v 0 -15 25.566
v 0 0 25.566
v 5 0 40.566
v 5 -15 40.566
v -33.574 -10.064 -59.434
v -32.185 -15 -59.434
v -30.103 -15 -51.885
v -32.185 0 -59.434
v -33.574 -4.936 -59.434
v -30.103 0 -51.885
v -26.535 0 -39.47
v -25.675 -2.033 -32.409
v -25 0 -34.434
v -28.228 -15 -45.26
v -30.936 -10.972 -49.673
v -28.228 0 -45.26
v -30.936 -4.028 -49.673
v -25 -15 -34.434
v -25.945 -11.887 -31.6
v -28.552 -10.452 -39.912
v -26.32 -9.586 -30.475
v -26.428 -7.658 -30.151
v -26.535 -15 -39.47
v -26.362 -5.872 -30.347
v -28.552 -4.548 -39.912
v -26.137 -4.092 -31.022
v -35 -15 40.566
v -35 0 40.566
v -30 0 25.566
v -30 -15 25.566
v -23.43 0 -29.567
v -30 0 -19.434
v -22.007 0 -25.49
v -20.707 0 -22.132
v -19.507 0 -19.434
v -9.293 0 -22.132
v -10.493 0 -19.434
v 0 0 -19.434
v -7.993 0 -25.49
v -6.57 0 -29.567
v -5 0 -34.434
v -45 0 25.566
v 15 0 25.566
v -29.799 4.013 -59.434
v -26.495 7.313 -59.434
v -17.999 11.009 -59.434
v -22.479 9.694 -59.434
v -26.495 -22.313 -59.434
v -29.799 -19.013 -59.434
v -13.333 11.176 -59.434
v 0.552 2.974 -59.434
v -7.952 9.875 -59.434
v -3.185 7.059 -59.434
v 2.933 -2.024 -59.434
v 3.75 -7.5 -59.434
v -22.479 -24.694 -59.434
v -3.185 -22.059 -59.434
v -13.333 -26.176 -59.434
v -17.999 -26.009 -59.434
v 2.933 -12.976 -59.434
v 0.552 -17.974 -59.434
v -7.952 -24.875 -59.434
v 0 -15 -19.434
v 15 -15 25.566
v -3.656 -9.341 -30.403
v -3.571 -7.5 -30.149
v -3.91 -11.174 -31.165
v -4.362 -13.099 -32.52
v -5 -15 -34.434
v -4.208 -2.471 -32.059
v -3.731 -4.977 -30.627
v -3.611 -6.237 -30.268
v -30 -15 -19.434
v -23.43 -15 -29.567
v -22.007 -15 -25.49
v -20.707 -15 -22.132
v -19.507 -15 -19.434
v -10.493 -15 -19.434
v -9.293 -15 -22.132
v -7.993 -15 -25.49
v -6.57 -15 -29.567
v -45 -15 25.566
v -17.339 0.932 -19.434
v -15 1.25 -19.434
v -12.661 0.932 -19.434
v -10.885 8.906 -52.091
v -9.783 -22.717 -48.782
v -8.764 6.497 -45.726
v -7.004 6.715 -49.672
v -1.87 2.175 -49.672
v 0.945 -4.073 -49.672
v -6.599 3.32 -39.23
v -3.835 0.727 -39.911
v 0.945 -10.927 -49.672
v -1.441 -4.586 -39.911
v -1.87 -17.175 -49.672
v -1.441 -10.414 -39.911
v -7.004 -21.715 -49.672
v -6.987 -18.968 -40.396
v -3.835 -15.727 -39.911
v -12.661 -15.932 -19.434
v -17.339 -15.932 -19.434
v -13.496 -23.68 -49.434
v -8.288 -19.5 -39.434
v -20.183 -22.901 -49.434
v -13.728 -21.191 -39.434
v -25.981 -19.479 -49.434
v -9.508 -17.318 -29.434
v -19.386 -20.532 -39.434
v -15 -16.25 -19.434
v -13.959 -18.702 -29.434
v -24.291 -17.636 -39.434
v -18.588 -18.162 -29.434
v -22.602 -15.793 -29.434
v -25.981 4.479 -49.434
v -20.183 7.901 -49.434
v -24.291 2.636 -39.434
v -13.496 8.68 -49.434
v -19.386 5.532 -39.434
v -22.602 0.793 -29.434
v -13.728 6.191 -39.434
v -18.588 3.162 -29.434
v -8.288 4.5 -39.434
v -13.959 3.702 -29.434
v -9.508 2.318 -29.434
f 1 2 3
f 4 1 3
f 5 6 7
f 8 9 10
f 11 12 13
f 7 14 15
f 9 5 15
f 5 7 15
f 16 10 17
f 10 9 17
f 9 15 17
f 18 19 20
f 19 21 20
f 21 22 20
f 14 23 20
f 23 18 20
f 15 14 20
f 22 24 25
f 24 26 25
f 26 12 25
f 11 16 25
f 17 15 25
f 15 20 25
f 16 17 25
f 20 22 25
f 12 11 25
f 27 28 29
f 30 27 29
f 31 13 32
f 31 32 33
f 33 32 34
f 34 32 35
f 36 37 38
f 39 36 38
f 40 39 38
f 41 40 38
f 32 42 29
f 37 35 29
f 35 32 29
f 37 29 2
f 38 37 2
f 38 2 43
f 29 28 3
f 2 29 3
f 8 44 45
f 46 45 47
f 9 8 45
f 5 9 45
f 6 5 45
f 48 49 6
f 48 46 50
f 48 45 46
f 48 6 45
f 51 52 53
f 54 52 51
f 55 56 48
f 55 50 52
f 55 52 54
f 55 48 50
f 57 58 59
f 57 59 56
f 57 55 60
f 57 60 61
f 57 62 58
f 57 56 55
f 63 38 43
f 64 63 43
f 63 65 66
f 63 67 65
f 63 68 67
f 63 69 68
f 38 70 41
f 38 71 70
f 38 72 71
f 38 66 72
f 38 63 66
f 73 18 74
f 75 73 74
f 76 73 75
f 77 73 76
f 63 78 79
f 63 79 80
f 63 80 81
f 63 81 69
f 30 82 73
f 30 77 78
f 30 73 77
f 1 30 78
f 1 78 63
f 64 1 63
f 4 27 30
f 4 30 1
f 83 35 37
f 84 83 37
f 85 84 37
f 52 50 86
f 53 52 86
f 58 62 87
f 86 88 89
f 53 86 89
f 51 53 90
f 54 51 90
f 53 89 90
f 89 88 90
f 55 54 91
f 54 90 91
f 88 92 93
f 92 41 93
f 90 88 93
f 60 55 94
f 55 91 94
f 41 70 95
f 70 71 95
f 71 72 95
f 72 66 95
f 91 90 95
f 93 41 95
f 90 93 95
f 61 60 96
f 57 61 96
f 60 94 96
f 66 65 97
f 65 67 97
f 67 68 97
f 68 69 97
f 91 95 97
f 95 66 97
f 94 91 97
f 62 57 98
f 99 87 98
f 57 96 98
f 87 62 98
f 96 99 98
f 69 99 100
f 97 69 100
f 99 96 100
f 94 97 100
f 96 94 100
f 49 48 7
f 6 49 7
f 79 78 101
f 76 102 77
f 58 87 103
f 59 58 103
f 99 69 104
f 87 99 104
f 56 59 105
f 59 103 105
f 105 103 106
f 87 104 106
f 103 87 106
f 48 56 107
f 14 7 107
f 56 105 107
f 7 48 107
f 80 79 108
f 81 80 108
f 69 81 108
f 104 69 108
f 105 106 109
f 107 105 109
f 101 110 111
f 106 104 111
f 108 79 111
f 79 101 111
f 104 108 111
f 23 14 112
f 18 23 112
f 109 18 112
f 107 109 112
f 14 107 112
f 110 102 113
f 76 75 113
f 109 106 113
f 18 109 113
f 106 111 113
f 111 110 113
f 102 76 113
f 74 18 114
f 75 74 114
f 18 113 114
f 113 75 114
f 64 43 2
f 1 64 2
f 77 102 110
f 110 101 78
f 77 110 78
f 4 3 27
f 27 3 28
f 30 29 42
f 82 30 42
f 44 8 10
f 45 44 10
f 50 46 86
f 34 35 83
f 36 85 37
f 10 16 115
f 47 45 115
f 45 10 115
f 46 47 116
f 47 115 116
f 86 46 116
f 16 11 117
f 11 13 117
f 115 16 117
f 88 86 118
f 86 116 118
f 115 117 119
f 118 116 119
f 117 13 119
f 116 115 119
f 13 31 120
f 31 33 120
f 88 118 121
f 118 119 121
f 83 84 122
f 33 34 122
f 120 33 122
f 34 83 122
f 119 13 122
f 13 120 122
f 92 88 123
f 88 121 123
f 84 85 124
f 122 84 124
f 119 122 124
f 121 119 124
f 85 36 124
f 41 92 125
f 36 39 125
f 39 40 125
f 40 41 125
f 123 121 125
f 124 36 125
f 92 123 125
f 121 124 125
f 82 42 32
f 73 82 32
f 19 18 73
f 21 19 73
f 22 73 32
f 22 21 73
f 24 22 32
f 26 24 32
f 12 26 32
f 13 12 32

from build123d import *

# Parameters (mm, degrees)
F1_DEPTH = 15
F2_R     = 18.75
F3_DEPTH = 40


# Not quite as in the source:
# - a fillet or chamfer that OpenCascade refuses, or shapes differently, is made with other operations: its cross-section is extruded or revolved along the edge and cut away or added


with BuildPart() as f1:
    # F0 (on Front) → F1 (new body)
    with BuildSketch(Plane.XZ):
        Polygon((-15, 40.5656324383), (-35, 40.5656324383), (-30, 25.5656324383), (-15, 25.5656324383), align=None)
        Polygon((5, 40.5656324383), (-15, 40.5656324383), (-15, 25.5656324383), (0, 25.5656324383), align=None)
        Polygon((-15, 25.5656324383), (-30, 25.5656324383), (-45, 25.5656324383), (-30, -19.4343675617), (0, -19.4343675617), (15, 25.5656324383), (0, 25.5656324383), align=None)
    extrude(amount=F1_DEPTH)

    # F2 (on face) → F3 (join)
    with BuildSketch(Plane(origin=(0, 0, -19.4343675617), x_dir=(1, 0, 0), z_dir=(0, 0, -1))):
        with Locations((-15, 7.5)):
            Circle(F2_R)
    extrude(amount=F3_DEPTH)

    # F4: chamfer of 10 x 40 on 1 edges, made by hand


with BuildPart() as f4_tool2:
    # F4_s3 → F4_t4 (revolve)
    with BuildSketch(Plane.XZ.offset(7.5)):
        Polygon((3.75, -59.4343675617), (-6.25, -19.4343675617), (3.75, -19.4343675617), align=None)
    revolve(axis=Axis((-15, -7.5, -19.4343675617), (0, 0, -1)))

    split(bisect_by=Plane(origin=(5.8303102685, 0, -1.9434367562), x_dir=(0, 1, 0), z_dir=(0.9486832981, 0, -0.316227766)), keep=Keep.TOP)


with BuildPart() as f1_1:
    add(f1.part)

    # F4_t1: cut F4_tool2
    add(f4_tool2.part, mode=Mode.SUBTRACT)


with BuildPart() as f4_tool7:
    # F4_s8 → F4_t9 (revolve)
    with BuildSketch(Plane.XZ.offset(7.5)):
        Polygon((3.75, -59.4343675617), (-6.25, -19.4343675617), (3.75, -19.4343675617), align=None)
    revolve(axis=Axis((-15, -7.5, -19.4343675617), (0, 0, -1)))

    split(bisect_by=Plane.XZ.offset(15), keep=Keep.TOP)


with BuildPart() as f1_2:
    add(f1_1.part)

    # F4_t6: cut F4_tool7
    add(f4_tool7.part, mode=Mode.SUBTRACT)


with BuildPart() as f4_tool12:
    # F4_s13 → F4_t14 (revolve)
    with BuildSketch(Plane.XZ.offset(7.5)):
        Polygon((3.75, -59.4343675617), (-6.25, -19.4343675617), (3.75, -19.4343675617), align=None)
    revolve(axis=Axis((-15, -7.5, -19.4343675617), (0, 0, -1)))

    split(bisect_by=Plane.XZ, keep=Keep.BOTTOM)


with BuildPart() as f1_3:
    add(f1_2.part)

    # F4_t11: cut F4_tool12
    add(f4_tool12.part, mode=Mode.SUBTRACT)


with BuildPart() as f4_tool17:
    # F4_s18 → F4_t19 (revolve)
    with BuildSketch(Plane.XZ.offset(7.5)):
        Polygon((3.75, -59.4343675617), (-6.25, -19.4343675617), (3.75, -19.4343675617), align=None)
    revolve(axis=Axis((-15, -7.5, -19.4343675617), (0, 0, -1)))

    split(bisect_by=Plane(origin=(-32.8303102685, 0, -10.9434367562), x_dir=(0, 1, 0), z_dir=(-0.9486832981, 0, -0.316227766)), keep=Keep.TOP)


with BuildPart() as f1_4:
    add(f1_3.part)

    # F4_t16: cut F4_tool17
    add(f4_tool17.part, mode=Mode.SUBTRACT)


solid = f1_4.part
